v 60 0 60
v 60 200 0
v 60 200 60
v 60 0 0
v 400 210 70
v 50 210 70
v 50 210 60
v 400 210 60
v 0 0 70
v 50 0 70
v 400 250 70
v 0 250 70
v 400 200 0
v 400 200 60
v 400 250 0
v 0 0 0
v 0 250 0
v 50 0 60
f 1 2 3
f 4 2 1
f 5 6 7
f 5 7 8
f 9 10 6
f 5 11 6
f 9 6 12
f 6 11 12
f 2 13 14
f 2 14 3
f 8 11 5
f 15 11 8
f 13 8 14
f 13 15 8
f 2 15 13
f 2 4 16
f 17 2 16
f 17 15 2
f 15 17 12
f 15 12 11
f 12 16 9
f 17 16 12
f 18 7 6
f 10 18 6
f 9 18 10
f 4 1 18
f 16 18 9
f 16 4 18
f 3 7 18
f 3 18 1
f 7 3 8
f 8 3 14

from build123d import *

# Parameters (mm, degrees)
EXTRUDE_1_DEPTH     = 70
SKETCH_3_W          = 10
SKETCH_3_H          = 10
CUT_EXTRUDE_1_DEPTH = 210
SKETCH_4_W          = 10
SKETCH_4_H          = 10
CUT_EXTRUDE_2_DEPTH = 340


with BuildPart() as part:
    # Эскиз2 → Бобышка-Вытянуть1 (new body)
    with BuildSketch(Plane.XY):
        Polygon((0, 0), (0, 250), (400, 250), (400, 200), (60, 200), (60, 0), align=None)
    extrude(amount=EXTRUDE_1_DEPTH)

    # Эскиз3 → Вырез-Вытянуть1 (cut)
    with BuildSketch(Plane.XZ):
        with Locations((55, 65)):
            Rectangle(SKETCH_3_W, SKETCH_3_H)
    extrude(amount=-CUT_EXTRUDE_1_DEPTH, mode=Mode.SUBTRACT)

    # Эскиз4 → Вырез-Вытянуть2 (cut)
    with BuildSketch(Plane(origin=(400, 0, 0), x_dir=(0, 0, -1), z_dir=(1, 0, 0))):
        with Locations((-65, 205)):
            Rectangle(SKETCH_4_W, SKETCH_4_H)
    extrude(amount=-CUT_EXTRUDE_2_DEPTH, mode=Mode.SUBTRACT)


solid = part.part
